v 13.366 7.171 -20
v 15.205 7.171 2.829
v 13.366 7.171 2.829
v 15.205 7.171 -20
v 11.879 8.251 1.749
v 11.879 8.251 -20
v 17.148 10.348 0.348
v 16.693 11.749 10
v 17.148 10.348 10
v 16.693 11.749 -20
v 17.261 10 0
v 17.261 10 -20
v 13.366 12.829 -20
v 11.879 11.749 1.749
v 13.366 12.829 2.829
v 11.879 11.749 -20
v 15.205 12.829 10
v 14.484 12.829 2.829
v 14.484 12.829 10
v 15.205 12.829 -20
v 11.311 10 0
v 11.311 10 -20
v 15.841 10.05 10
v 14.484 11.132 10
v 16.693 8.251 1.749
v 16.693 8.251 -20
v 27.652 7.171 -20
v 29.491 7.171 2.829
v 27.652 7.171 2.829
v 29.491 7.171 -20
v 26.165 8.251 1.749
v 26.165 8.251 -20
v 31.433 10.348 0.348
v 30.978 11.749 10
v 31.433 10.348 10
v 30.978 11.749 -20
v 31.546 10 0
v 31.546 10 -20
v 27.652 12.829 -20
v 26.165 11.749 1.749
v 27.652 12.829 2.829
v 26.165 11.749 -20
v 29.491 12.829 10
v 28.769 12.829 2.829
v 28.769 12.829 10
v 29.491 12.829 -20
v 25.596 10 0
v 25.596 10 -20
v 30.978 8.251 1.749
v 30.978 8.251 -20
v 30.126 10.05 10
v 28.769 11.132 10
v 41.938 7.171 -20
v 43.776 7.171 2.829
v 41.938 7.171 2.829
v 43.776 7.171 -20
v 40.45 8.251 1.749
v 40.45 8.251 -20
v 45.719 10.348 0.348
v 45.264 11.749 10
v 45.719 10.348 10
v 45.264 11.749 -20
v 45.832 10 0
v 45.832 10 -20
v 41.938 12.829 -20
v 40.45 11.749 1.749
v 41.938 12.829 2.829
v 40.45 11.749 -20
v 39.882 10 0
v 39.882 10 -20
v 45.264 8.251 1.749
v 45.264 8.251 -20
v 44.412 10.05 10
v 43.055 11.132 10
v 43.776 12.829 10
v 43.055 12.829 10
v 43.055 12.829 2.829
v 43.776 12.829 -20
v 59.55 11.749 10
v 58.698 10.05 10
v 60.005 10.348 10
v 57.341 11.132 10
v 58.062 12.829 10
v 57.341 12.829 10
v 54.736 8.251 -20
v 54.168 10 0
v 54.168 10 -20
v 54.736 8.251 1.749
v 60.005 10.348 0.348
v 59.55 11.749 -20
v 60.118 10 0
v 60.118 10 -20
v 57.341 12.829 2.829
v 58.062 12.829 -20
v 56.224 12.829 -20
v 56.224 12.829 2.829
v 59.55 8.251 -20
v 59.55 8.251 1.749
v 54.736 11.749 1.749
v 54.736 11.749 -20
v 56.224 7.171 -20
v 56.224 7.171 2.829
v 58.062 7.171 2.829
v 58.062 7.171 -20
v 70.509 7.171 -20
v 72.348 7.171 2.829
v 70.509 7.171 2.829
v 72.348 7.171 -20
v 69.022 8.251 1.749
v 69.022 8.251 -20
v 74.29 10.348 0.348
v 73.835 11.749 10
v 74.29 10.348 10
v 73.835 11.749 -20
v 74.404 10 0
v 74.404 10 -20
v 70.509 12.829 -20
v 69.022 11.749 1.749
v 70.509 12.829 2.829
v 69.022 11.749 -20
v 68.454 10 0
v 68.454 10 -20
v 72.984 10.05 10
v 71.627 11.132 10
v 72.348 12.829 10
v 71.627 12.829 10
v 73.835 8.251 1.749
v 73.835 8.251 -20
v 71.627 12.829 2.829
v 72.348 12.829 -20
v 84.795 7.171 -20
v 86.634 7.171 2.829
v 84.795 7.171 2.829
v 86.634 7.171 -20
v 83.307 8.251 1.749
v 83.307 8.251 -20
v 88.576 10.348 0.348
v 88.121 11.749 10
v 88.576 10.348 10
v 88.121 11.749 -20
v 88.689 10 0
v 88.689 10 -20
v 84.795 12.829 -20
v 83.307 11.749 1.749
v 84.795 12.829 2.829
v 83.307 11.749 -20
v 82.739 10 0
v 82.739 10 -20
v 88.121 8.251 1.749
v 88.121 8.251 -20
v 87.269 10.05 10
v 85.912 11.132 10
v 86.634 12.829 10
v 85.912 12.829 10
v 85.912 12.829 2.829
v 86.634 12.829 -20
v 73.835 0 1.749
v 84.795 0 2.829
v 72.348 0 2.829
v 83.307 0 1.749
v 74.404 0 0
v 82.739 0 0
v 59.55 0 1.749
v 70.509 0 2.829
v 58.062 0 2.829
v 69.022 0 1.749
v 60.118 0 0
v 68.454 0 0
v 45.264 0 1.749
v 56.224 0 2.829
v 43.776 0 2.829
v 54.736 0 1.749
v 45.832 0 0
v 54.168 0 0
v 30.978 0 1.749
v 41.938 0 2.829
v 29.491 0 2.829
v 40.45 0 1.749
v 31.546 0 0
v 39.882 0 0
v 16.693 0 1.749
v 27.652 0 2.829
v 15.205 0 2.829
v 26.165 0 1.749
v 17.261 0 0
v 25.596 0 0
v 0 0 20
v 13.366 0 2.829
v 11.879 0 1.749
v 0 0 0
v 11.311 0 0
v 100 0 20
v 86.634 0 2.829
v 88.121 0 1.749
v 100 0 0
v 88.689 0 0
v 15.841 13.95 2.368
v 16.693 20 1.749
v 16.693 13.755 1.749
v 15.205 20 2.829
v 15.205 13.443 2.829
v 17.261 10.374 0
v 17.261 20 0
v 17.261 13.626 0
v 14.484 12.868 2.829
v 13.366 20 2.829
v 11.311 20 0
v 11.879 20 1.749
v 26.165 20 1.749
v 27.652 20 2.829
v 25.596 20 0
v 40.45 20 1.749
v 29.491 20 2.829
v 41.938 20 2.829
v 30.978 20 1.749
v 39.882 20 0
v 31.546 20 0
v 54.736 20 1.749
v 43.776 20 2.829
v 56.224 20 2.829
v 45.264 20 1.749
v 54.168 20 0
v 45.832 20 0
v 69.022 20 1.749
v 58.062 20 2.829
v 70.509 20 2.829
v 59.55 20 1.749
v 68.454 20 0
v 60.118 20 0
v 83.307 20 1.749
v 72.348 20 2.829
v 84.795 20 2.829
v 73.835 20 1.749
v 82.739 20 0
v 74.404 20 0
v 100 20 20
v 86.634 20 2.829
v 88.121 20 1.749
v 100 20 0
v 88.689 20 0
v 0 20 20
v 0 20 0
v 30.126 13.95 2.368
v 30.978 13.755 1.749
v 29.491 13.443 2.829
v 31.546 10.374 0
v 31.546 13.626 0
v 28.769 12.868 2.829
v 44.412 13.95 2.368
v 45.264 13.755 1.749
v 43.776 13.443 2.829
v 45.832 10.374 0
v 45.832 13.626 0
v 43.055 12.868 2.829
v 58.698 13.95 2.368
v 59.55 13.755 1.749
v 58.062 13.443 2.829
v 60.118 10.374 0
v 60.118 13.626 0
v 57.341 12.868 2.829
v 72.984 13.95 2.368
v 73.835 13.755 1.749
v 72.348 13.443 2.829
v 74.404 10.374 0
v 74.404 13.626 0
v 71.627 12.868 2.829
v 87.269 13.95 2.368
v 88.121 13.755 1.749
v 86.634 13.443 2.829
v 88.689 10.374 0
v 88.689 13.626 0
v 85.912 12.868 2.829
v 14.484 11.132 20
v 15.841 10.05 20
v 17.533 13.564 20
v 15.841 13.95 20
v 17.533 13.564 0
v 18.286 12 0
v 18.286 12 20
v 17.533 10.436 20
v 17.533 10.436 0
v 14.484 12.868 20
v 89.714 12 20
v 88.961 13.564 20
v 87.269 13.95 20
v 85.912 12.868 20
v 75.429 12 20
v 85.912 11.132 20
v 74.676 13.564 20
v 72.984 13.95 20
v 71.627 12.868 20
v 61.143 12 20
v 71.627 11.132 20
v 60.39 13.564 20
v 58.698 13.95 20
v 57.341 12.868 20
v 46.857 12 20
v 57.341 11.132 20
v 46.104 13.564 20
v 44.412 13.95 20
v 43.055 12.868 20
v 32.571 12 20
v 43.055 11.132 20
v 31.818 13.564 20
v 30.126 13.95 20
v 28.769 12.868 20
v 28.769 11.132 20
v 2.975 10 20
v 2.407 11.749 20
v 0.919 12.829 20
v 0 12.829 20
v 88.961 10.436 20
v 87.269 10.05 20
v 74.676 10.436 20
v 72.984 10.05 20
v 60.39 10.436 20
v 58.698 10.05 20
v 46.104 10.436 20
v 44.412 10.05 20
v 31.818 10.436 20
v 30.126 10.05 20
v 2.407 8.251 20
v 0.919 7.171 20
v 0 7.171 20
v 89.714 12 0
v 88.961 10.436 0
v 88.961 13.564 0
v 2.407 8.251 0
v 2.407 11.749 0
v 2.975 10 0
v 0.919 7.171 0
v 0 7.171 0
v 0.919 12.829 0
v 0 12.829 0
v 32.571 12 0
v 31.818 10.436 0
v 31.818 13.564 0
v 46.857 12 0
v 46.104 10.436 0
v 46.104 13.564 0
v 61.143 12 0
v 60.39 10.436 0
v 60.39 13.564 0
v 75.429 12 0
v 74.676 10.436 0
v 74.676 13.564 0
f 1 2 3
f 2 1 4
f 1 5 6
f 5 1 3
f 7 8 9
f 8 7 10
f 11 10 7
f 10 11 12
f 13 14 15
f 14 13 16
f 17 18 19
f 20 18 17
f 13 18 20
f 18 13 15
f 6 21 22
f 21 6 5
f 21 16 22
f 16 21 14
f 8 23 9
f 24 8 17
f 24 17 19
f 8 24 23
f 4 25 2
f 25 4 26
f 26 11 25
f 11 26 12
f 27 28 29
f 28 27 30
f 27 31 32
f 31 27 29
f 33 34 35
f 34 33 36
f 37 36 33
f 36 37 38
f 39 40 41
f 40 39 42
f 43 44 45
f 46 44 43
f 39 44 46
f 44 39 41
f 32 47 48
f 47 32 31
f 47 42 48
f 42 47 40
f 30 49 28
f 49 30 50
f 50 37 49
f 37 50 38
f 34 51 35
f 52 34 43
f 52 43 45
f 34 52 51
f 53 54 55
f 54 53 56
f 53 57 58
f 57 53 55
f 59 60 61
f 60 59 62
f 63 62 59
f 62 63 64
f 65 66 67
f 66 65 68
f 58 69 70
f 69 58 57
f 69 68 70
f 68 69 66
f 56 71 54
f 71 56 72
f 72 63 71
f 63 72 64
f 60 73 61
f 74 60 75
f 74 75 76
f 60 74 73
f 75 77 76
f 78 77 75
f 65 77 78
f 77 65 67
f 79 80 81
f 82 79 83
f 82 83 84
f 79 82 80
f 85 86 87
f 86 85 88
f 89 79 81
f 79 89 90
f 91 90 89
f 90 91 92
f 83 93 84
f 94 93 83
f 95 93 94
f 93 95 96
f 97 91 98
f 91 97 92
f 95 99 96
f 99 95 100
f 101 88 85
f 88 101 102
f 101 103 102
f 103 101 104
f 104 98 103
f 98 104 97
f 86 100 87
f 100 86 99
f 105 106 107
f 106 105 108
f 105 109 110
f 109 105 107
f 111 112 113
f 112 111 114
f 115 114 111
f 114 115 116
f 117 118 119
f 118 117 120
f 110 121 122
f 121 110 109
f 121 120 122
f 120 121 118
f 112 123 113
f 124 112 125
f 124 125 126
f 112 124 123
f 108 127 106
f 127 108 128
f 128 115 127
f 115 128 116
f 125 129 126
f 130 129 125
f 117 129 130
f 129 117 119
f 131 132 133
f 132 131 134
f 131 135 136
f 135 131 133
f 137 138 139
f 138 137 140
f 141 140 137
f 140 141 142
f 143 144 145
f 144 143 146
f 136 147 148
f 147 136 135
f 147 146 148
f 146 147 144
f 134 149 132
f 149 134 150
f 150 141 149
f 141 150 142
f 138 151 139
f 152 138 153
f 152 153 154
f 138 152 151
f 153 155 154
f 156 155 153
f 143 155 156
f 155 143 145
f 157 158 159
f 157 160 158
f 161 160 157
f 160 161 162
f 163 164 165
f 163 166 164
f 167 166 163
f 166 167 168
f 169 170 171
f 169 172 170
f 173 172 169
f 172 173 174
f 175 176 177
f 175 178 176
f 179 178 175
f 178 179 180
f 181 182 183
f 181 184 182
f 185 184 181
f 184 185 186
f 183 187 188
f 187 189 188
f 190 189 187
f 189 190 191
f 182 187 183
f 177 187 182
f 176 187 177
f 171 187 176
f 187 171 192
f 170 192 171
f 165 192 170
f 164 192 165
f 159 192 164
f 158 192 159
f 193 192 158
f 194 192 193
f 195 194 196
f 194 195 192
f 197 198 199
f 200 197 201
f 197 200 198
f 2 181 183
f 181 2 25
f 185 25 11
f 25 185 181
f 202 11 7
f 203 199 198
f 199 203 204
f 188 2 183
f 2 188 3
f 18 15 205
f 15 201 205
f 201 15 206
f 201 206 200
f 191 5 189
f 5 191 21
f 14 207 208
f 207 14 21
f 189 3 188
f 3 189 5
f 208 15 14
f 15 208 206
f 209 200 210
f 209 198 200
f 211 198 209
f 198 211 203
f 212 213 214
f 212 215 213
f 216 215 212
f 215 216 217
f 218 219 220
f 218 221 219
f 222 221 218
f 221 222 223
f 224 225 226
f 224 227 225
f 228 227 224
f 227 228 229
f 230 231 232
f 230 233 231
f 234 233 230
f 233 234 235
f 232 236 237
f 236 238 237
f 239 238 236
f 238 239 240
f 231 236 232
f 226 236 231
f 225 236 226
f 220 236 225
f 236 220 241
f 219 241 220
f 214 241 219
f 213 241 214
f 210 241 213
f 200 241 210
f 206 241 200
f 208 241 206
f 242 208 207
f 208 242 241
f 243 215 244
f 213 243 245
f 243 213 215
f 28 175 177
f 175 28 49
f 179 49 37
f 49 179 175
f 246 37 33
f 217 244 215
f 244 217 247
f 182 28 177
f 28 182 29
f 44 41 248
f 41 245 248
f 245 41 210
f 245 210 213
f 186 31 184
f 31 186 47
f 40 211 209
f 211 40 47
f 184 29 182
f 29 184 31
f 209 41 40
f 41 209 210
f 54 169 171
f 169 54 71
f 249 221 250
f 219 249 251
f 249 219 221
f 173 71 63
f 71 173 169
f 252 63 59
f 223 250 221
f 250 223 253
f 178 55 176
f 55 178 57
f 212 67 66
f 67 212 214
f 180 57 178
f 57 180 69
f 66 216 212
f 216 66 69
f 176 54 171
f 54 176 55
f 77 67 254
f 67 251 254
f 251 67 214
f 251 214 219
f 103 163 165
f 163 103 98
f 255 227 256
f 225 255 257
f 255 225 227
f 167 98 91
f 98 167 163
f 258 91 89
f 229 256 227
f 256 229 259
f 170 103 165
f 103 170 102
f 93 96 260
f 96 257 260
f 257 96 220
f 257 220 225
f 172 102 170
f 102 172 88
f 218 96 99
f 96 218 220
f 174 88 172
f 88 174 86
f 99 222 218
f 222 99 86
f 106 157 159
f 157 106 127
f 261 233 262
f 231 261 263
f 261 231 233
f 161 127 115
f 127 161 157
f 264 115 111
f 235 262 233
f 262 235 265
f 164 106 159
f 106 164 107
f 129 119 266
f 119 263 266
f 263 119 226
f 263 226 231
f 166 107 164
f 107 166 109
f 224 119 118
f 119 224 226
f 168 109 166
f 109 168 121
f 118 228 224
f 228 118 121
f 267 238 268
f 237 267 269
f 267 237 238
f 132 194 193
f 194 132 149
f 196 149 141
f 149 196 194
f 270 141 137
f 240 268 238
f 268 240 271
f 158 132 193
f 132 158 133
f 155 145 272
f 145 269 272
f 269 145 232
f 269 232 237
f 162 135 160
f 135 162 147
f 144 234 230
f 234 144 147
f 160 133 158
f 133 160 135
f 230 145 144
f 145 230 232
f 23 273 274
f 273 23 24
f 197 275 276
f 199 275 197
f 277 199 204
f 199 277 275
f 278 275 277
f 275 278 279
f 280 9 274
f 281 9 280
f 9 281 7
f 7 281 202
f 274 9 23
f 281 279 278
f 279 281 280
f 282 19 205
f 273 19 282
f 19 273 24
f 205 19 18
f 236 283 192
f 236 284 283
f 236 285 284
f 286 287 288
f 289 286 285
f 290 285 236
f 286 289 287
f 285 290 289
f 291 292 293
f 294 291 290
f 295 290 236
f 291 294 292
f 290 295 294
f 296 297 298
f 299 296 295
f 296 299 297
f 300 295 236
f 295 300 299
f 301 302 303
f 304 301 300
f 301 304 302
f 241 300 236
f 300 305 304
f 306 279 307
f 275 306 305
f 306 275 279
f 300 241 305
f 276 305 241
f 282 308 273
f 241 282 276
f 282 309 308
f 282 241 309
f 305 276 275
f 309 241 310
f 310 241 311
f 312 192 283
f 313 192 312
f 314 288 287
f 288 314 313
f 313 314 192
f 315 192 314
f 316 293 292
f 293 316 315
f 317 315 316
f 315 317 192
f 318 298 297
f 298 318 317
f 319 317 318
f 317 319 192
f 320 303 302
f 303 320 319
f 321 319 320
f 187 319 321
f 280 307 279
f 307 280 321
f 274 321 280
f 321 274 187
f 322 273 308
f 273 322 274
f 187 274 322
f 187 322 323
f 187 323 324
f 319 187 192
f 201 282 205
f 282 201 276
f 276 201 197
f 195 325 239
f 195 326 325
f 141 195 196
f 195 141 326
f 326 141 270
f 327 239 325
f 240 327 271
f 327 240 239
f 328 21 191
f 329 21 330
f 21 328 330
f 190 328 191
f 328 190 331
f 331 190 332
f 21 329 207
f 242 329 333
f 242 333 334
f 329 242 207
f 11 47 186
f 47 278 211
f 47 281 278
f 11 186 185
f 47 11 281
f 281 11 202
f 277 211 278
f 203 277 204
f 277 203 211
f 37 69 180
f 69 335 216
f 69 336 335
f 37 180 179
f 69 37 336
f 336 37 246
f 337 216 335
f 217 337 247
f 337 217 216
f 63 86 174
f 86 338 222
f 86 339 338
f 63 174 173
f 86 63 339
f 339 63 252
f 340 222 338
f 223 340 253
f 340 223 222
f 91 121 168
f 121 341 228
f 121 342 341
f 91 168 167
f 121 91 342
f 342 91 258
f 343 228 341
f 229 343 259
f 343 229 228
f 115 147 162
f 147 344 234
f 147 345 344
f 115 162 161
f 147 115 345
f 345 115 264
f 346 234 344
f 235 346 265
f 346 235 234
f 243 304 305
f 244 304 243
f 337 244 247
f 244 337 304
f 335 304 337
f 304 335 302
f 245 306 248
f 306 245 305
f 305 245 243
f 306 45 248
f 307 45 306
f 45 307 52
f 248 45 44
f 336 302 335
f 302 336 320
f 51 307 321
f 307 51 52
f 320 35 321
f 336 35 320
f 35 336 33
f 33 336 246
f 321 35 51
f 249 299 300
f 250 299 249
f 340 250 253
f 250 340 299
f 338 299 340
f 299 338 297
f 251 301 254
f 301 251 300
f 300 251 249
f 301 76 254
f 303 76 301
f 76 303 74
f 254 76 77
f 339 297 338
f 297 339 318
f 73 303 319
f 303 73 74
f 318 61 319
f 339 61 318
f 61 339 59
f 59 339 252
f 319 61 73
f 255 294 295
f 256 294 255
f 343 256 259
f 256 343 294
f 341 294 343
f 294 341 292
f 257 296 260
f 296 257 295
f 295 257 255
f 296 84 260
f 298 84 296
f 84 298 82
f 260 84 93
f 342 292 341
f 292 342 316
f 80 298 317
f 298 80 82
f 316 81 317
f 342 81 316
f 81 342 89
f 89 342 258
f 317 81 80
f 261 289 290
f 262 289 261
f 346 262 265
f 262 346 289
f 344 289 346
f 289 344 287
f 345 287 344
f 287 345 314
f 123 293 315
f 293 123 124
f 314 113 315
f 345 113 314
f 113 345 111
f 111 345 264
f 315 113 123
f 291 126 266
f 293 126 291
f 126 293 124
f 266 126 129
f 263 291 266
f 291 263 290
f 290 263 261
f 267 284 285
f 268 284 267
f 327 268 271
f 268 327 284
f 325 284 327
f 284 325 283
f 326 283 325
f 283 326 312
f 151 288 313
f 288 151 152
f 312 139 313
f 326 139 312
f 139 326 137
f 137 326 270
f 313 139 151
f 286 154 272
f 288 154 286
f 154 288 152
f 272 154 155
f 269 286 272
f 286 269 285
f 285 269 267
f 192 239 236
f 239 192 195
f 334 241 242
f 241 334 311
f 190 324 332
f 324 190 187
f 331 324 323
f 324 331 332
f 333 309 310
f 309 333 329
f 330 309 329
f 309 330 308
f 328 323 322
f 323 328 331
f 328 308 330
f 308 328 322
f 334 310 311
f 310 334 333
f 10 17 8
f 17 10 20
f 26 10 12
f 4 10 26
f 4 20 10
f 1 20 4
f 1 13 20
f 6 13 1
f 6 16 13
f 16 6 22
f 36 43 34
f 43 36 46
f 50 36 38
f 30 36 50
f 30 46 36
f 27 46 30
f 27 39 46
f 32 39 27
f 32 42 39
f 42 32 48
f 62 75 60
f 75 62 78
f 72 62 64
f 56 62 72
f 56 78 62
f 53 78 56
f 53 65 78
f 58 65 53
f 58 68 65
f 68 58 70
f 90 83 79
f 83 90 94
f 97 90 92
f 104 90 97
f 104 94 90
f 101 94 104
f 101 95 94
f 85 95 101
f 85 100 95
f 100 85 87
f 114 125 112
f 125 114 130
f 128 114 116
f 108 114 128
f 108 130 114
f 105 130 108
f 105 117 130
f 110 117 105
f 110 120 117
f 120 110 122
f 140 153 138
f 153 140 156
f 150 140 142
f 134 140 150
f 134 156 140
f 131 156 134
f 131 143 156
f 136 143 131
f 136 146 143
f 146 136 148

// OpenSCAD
// Parameters
outlet_diameter = 5.95; // in mm
manifold_length = 100; // in mm
manifold_width = 20; // in mm
manifold_height = 20; // in mm
outlet_spacing = manifold_length / 7; // evenly spaced
outlet_length = 10; // in mm
channel_diameter = outlet_diameter; // internal channels diameter
fillet_radius = 2; // radius for fillets

// Function to create fillets (simple approximation using cylinders)
module fillet(radius) {
    translate([radius, radius, 0])
        cylinder(r = radius, h = manifold_height, center = true);
}

// Main manifold body
difference() {
    cube([manifold_length, manifold_width, manifold_height]);

    // Create holes for outlets
    for (i = [1:6]) {
        translate([i * outlet_spacing, manifold_width / 2, 0]) {
            cylinder(h = manifold_height, d = outlet_diameter, center = true);
        }
    }

    // Create internal channels
    translate([0, manifold_width / 2, manifold_height / 2]) {
        cylinder(h = manifold_length, d = channel_diameter, center = true);
    }

    for (i = [1:6]) {
        translate([i * outlet_spacing, manifold_width / 2, 0]) {
            rotate([90, 0, 0]) {
                cylinder(h = manifold_width, d = channel_diameter, center = true);
            }
        }
    }

    // Add fillets at junctions
    for (i = [1:6]) {
        translate([i * outlet_spacing, manifold_width / 2, manifold_height / 2]) {
            fillet(fillet_radius);
        }
    }
}

// Outlets
for (i = [1:6]) {
    translate([i * outlet_spacing, manifold_width / 2, -outlet_length / 2]) {
        cylinder(h = outlet_length + manifold_height, d = outlet_diameter, center = true);
    }
}
